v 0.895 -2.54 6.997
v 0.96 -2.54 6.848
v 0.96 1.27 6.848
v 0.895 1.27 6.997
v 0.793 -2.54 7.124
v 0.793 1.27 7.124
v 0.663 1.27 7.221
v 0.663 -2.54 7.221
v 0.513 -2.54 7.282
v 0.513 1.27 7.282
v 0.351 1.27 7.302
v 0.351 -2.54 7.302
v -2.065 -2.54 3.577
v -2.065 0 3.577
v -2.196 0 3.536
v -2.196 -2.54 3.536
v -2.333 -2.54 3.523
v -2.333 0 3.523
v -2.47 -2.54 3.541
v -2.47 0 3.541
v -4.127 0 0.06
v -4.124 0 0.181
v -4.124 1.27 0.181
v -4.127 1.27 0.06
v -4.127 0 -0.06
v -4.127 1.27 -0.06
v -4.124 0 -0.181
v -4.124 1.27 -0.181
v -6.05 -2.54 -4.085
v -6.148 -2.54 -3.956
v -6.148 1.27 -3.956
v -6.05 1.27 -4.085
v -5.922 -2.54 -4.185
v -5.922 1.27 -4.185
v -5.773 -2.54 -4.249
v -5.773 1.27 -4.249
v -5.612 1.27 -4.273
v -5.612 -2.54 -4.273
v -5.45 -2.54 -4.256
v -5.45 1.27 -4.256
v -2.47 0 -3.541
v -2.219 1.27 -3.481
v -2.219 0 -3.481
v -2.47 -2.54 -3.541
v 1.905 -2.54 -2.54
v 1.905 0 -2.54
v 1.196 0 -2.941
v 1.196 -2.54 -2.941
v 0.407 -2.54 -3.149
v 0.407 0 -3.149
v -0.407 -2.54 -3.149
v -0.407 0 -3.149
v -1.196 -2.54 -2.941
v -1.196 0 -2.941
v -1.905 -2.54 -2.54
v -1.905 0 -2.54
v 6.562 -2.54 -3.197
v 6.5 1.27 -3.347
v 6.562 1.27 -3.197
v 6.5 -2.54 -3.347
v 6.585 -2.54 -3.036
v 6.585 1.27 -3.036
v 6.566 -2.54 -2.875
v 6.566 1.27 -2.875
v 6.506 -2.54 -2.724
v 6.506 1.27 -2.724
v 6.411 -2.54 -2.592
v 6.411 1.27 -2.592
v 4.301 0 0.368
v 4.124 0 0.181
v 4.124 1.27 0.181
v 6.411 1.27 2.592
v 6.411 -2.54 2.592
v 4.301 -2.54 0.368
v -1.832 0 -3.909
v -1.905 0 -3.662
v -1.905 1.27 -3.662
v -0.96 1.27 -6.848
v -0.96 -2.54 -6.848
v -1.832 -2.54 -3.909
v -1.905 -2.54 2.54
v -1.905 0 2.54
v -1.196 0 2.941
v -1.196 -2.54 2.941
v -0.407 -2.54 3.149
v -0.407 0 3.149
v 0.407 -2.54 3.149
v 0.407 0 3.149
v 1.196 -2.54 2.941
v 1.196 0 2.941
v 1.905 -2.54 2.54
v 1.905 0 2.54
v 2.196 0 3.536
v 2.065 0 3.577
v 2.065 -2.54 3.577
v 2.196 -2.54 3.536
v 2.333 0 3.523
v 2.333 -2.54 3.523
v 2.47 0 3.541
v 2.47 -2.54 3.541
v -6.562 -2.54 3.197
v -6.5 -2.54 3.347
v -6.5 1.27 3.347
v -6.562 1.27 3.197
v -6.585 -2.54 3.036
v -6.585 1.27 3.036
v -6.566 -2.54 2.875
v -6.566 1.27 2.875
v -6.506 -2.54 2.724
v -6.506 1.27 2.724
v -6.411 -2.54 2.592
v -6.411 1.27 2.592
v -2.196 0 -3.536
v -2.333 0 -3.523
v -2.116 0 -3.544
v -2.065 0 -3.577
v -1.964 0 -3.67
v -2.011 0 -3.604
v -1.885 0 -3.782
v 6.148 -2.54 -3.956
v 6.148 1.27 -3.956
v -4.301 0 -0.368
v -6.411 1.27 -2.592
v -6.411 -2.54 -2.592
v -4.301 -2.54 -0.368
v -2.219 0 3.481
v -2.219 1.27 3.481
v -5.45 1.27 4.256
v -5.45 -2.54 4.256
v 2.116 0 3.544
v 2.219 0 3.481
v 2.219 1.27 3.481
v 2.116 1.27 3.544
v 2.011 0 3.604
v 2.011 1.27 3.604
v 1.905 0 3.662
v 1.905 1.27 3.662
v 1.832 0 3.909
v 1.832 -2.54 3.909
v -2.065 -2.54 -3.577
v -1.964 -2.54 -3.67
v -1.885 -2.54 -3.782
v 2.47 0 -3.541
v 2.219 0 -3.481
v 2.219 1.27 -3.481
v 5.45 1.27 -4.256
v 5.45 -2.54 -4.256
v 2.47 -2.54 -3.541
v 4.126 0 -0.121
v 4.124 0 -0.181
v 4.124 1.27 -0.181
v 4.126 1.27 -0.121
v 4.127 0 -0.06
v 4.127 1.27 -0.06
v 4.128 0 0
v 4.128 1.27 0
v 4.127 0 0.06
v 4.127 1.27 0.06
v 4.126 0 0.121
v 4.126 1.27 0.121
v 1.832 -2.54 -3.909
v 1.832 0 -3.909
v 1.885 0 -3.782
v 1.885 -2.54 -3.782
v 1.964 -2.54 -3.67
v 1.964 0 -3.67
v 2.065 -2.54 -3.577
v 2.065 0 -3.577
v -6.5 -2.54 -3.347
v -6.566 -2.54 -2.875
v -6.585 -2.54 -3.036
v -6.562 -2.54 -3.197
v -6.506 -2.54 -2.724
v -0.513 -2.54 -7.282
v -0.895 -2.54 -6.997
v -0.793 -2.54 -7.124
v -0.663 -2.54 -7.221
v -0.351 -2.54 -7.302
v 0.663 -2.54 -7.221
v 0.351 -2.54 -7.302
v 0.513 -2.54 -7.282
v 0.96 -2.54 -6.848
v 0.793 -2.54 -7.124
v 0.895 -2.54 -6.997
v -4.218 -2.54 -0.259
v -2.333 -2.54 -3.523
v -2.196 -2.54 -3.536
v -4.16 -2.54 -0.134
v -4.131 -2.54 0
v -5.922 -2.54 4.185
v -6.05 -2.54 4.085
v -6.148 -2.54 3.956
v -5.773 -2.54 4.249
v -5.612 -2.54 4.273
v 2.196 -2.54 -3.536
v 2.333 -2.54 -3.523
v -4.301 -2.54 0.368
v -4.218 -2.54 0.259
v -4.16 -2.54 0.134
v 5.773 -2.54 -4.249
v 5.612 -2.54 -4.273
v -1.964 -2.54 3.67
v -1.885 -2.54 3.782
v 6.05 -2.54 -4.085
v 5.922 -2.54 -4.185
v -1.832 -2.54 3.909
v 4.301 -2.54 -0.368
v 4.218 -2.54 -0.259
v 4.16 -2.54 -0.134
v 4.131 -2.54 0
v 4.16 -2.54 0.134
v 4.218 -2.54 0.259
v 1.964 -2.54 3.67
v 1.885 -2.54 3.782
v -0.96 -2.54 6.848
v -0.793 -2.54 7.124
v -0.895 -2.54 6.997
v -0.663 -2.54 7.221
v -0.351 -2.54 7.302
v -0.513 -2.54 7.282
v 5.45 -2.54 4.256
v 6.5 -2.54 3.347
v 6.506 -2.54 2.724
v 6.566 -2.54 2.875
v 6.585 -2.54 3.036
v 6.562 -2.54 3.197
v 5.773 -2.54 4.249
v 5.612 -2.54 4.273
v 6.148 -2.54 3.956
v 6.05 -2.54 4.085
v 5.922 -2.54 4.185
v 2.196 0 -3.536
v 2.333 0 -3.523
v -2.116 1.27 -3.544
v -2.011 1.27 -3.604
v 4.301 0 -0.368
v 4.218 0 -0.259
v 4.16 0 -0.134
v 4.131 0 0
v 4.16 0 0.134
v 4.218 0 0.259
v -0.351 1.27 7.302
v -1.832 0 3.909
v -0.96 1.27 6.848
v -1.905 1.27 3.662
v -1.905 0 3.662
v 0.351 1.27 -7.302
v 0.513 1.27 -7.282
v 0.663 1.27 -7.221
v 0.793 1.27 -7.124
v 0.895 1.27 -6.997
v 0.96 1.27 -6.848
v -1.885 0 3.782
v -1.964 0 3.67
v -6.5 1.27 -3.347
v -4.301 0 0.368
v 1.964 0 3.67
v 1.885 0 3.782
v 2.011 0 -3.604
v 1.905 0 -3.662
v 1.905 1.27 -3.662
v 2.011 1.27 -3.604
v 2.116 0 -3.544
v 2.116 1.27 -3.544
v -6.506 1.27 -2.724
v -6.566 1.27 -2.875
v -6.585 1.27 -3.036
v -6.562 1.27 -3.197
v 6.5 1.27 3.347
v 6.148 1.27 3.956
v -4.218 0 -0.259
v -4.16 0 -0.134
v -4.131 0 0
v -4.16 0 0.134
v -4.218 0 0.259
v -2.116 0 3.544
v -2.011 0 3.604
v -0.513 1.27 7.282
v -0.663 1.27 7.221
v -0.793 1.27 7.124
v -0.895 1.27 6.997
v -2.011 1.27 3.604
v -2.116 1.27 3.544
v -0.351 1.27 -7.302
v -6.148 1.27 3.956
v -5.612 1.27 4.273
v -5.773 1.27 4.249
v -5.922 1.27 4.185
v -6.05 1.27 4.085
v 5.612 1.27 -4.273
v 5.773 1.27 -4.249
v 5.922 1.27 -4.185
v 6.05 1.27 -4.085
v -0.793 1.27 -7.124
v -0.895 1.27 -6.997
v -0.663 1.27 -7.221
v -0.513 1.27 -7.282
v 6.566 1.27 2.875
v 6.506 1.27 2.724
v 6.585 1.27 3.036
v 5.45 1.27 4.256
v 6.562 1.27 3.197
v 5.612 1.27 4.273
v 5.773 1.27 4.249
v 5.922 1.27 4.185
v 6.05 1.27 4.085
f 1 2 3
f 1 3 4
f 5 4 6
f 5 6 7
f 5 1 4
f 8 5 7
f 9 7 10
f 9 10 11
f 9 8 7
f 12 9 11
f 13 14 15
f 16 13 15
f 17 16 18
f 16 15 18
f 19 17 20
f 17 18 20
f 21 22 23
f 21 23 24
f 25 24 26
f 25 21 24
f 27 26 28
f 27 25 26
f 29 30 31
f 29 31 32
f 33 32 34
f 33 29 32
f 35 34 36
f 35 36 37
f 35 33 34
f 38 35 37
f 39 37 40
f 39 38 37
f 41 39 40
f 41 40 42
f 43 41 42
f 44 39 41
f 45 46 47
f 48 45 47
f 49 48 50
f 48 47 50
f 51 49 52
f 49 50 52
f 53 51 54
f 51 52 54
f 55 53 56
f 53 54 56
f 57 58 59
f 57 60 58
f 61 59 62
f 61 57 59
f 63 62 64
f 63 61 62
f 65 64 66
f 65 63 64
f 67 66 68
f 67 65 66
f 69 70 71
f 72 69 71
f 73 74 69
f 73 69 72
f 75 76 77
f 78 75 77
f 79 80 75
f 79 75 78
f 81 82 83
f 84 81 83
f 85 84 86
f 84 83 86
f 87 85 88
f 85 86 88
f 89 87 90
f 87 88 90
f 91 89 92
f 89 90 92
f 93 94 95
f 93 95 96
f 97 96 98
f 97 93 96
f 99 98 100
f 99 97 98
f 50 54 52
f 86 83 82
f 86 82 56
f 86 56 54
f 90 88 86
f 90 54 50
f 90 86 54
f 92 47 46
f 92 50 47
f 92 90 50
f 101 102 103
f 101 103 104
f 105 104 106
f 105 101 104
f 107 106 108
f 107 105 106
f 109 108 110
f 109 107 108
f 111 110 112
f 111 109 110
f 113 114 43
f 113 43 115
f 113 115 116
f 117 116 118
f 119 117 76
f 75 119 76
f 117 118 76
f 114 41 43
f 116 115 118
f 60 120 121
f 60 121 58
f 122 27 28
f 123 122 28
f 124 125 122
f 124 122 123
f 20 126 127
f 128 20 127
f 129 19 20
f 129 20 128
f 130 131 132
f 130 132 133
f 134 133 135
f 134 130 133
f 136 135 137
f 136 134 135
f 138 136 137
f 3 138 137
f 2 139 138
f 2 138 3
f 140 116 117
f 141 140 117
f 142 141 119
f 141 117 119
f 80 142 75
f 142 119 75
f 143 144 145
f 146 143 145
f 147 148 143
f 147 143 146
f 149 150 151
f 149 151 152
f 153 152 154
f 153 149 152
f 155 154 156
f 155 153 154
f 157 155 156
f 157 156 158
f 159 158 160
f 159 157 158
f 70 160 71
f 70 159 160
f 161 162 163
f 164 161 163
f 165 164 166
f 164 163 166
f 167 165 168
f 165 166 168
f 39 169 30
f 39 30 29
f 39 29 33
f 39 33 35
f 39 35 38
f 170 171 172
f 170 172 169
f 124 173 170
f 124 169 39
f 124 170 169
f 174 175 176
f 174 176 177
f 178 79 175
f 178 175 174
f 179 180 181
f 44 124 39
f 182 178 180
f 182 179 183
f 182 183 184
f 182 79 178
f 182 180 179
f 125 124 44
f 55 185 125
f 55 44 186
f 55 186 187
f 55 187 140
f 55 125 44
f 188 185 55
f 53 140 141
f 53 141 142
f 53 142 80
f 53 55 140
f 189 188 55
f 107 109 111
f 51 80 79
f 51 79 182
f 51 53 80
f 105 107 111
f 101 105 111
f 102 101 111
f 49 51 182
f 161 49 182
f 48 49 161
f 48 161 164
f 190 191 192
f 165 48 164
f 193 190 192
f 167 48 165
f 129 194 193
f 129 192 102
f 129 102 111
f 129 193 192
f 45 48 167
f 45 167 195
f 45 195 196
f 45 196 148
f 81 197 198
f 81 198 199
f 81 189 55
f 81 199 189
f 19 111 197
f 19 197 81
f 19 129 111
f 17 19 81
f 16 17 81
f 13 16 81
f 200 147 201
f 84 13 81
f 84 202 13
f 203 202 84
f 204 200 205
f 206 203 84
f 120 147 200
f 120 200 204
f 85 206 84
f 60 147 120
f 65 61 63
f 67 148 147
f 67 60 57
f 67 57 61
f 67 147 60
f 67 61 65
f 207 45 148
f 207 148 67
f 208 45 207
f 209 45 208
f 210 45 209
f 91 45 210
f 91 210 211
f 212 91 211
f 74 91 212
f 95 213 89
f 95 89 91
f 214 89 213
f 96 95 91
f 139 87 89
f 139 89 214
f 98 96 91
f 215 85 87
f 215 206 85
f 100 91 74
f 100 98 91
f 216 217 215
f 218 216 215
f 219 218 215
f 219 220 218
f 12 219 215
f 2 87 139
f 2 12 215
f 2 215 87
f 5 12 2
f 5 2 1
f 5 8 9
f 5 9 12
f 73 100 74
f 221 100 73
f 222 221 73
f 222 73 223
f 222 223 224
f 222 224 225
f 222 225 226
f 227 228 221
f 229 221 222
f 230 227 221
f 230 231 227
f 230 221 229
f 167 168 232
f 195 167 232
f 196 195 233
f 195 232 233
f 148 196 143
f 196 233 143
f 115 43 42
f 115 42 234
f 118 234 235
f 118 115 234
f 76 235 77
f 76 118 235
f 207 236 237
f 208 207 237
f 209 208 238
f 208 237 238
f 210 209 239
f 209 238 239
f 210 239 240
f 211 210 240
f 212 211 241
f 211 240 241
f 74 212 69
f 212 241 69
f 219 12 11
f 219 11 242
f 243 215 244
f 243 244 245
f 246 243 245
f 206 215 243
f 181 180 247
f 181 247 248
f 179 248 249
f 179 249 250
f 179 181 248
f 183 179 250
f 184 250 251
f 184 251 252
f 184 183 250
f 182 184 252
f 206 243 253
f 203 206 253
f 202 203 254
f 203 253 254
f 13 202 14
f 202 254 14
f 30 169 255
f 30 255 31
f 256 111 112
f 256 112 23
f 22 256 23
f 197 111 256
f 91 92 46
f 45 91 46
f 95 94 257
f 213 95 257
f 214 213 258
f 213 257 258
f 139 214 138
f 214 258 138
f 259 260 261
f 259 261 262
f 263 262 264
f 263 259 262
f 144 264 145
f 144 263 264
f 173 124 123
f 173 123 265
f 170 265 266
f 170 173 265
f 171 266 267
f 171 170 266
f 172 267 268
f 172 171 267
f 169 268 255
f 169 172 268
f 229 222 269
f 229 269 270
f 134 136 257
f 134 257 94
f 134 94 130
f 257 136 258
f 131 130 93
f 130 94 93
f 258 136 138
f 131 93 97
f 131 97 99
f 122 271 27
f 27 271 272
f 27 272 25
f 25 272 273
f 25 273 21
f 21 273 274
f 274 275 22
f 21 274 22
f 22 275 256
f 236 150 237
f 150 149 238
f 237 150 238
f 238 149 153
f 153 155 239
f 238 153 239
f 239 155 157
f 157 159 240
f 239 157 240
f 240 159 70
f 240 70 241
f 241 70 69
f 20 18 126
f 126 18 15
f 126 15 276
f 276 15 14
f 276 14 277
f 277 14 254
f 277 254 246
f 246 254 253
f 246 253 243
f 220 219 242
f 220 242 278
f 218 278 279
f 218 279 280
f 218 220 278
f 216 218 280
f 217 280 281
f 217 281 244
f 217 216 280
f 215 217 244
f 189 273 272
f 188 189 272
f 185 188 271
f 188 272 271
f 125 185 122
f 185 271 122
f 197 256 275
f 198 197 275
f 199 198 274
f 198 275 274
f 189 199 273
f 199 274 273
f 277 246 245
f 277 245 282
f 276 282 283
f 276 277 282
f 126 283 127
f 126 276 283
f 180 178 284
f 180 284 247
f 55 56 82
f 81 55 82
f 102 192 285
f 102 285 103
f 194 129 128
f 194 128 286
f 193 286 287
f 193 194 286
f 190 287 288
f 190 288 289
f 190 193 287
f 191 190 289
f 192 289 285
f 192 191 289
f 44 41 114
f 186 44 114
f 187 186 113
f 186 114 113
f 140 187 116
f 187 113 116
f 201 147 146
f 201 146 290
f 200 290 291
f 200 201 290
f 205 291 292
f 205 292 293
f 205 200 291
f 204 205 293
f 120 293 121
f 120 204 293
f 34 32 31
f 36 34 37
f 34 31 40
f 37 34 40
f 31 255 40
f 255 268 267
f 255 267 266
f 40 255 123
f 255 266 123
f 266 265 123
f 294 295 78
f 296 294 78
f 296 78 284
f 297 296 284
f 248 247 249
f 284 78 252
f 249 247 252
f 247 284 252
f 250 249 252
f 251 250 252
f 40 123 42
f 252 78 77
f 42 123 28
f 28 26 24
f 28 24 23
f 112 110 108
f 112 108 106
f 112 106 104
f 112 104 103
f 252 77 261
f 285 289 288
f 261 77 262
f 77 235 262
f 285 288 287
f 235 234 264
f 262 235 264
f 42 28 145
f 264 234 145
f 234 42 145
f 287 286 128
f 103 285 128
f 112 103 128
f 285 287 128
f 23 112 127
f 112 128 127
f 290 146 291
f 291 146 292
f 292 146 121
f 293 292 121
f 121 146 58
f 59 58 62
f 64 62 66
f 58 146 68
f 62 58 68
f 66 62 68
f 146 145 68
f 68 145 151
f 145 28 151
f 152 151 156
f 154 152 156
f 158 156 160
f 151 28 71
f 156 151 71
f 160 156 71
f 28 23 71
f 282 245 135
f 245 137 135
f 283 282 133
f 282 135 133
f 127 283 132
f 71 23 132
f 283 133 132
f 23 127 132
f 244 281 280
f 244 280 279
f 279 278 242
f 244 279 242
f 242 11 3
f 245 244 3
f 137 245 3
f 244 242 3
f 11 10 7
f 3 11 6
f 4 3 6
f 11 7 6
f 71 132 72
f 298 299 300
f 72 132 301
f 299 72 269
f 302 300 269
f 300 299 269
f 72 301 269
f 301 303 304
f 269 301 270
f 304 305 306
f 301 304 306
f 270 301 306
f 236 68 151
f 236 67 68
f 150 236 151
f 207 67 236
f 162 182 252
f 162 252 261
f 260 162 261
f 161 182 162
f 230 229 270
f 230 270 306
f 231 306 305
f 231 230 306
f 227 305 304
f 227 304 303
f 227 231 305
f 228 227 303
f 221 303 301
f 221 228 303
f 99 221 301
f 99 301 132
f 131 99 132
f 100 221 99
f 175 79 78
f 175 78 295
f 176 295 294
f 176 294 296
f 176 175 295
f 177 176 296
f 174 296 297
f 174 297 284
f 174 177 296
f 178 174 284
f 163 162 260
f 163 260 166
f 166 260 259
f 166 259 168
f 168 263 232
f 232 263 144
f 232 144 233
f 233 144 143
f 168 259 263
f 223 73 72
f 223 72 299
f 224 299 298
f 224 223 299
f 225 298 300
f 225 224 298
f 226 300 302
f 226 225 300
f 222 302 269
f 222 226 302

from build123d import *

# Parameters (mm, degrees)
F1_DEPTH    = 2.54
F2_T1_DEPTH = 2.54
F4_DEPTH    = 25.4
F5_DEPTH    = 1.27


# Not quite as in the source:
# - a fillet or chamfer that OpenCascade refuses, or shapes differently, is made with other operations: its cross-section is extruded or revolved along the edge and cut away or added


with BuildPart() as f1:
    # F0 (on Front) → F1 (new body)
    with BuildSketch(Plane.XZ):
        with BuildLine():
            ThreePointArc((4.1235287664, -0.1810159177), (4.1265070722, -0.090529737), (4.1275, 0))
            ThreePointArc((4.1275, 0), (4.1265070722, 0.090529737), (4.1235287664, 0.1810159177))
            ThreePointArc((4.1235287664, 0.1810159177), (3.5745198541, 2.06375), (2.2185287664, 3.4805727061))
            ThreePointArc((2.2185287664, 3.4805727061), (2.06375, 3.5745198541), (1.905, 3.6615886238))
            ThreePointArc((1.905, 3.6615886238), (0, 4.1275), (-1.905, 3.6615886238))
            ThreePointArc((-1.905, 3.6615886238), (-2.06375, 3.5745198541), (-2.2185287664, 3.4805727061))
            ThreePointArc((-2.2185287664, 3.4805727061), (-3.5745198541, 2.06375), (-4.1235287664, 0.1810159177))
            ThreePointArc((-4.1235287664, 0.1810159177), (-4.1275, 0), (-4.1235287664, -0.1810159177))
            ThreePointArc((-4.1235287664, -0.1810159177), (-3.5745198541, -2.06375), (-2.2185287664, -3.4805727061))
            ThreePointArc((-2.2185287664, -3.4805727061), (-2.06375, -3.5745198541), (-1.905, -3.6615886238))
            ThreePointArc((-1.905, -3.6615886238), (0, -4.1275), (1.905, -3.6615886238))
            ThreePointArc((1.905, -3.6615886238), (2.06375, -3.5745198541), (2.2185287664, -3.4805727061))
            ThreePointArc((2.2185287664, -3.4805727061), (3.5745198541, -2.06375), (4.1235287664, -0.1810159177))
        make_face()
        with BuildLine():
            ThreePointArc((2.2185287664, 3.4805727061), (3.5745198541, 2.06375), (4.1235287664, 0.1810159177))
            Line((4.1235287664, 0.1810159177), (6.4106736138, 2.5923984851))
            ThreePointArc((6.4106736138, 2.5923984851), (6.5805571254, 2.9548302166), (6.4998752479, 3.3468858277))
            Line((6.4998752479, 3.3468858277), (6.1484257743, 3.9556141723))
            ThreePointArc((6.1484257743, 3.9556141723), (5.8492365942, 4.2215145333), (5.4504197518, 4.2556069624))
            Line((5.4504197518, 4.2556069624), (2.2185287664, 3.4805727061))
        make_face()
        with BuildLine():
            Line((6.4106736138, -2.5923984851), (4.1235287664, -0.1810159177))
            ThreePointArc((4.1235287664, -0.1810159177), (3.5745198541, -2.06375), (2.2185287664, -3.4805727061))
            Line((2.2185287664, -3.4805727061), (5.4504197518, -4.2556069624))
            ThreePointArc((5.4504197518, -4.2556069624), (5.8492365942, -4.2215145333), (6.1484257743, -3.9556141723))
            Line((6.1484257743, -3.9556141723), (6.4998752479, -3.3468858277))
            ThreePointArc((6.4998752479, -3.3468858277), (6.5805571254, -2.9548302166), (6.4106736138, -2.5923984851))
        make_face()
        with BuildLine():
            ThreePointArc((-1.905, 3.6615886238), (0, 4.1275), (1.905, 3.6615886238))
            Line((1.905, 3.6615886238), (0.9602538621, 6.8480054475))
            ThreePointArc((0.9602538621, 6.8480054475), (0.7313205312, 7.17634475), (0.3514494736, 7.3025))
            Line((0.3514494736, 7.3025), (-0.3514494736, 7.3025))
            ThreePointArc((-0.3514494736, 7.3025), (-0.7313205312, 7.17634475), (-0.9602538621, 6.8480054475))
            Line((-0.9602538621, 6.8480054475), (-1.905, 3.6615886238))
        make_face()
        with BuildLine():
            Line((0.9602538621, -6.8480054475), (1.905, -3.6615886238))
            ThreePointArc((1.905, -3.6615886238), (0, -4.1275), (-1.905, -3.6615886238))
            Line((-1.905, -3.6615886238), (-0.9602538621, -6.8480054475))
            ThreePointArc((-0.9602538621, -6.8480054475), (-0.7313205312, -7.17634475), (-0.3514494736, -7.3025))
            Line((-0.3514494736, -7.3025), (0.3514494736, -7.3025))
            ThreePointArc((0.3514494736, -7.3025), (0.7313205312, -7.17634475), (0.9602538621, -6.8480054475))
        make_face()
        with BuildLine():
            ThreePointArc((-4.1235287664, 0.1810159177), (-3.5745198541, 2.06375), (-2.2185287664, 3.4805727061))
            Line((-2.2185287664, 3.4805727061), (-5.4504197518, 4.2556069624))
            ThreePointArc((-5.4504197518, 4.2556069624), (-5.8492365942, 4.2215145333), (-6.1484257743, 3.9556141723))
            Line((-6.1484257743, 3.9556141723), (-6.4998752479, 3.3468858277))
            ThreePointArc((-6.4998752479, 3.3468858277), (-6.5805571254, 2.9548302166), (-6.4106736138, 2.5923984851))
            Line((-6.4106736138, 2.5923984851), (-4.1235287664, 0.1810159177))
        make_face()
        with BuildLine():
            Line((-5.4504197518, -4.2556069624), (-2.2185287664, -3.4805727061))
            ThreePointArc((-2.2185287664, -3.4805727061), (-3.5745198541, -2.06375), (-4.1235287664, -0.1810159177))
            Line((-4.1235287664, -0.1810159177), (-6.4106736138, -2.5923984851))
            ThreePointArc((-6.4106736138, -2.5923984851), (-6.5805571254, -2.9548302166), (-6.4998752479, -3.3468858277))
            Line((-6.4998752479, -3.3468858277), (-6.1484257743, -3.9556141723))
            ThreePointArc((-6.1484257743, -3.9556141723), (-5.8492365942, -4.2215145333), (-5.4504197518, -4.2556069624))
        make_face()
    extrude(amount=F1_DEPTH)

    # F2: fillet of radius 0.635 on 12 edges, made by hand

    # F2_s2 → F2_t1 (join)
    with BuildSketch(Plane.XZ):
        with BuildLine():
            ThreePointArc((-4.3012819504, 0.3684246555), (-4.1738908411, 0.1709055432), (-4.1270722547, -0.0594209954))
            ThreePointArc((-4.1270722547, -0.0594209954), (-4.1270518266, 0.0608232715), (-4.1235287664, 0.1810159177))
            Line((-4.1235287664, 0.1810159177), (-4.3012819504, 0.3684246555))
        make_face()
        with BuildLine():
            ThreePointArc((-4.1270722547, 0.0594209954), (-4.1738908411, -0.1709055432), (-4.3012819504, -0.3684246555))
            Line((-4.3012819504, -0.3684246555), (-4.1235287664, -0.1810159177))
            ThreePointArc((-4.1235287664, -0.1810159177), (-4.1270518266, -0.0608232715), (-4.1270722547, 0.0594209954))
        make_face()
        with BuildLine():
            ThreePointArc((-1.8315758641, 3.9092317656), (-1.9389368785, 3.7001482727), (-2.1149962189, 3.5444389181))
            ThreePointArc((-2.1149962189, 3.5444389181), (-2.010851415, 3.6045433603), (-1.905, 3.6615886238))
            Line((-1.905, 3.6615886238), (-1.8315758641, 3.9092317656))
        make_face()
        with BuildLine():
            ThreePointArc((4.3012819504, -0.3684246555), (4.1738908411, -0.1709055432), (4.1270722547, 0.0594209954))
            ThreePointArc((4.1270722547, 0.0594209954), (4.1270518266, -0.0608232715), (4.1235287664, -0.1810159177))
            Line((4.1235287664, -0.1810159177), (4.3012819504, -0.3684246555))
        make_face()
        with BuildLine():
            ThreePointArc((2.0120760358, -3.6038599135), (2.2349539626, -3.5292427294), (2.4697060863, -3.5408071101))
            Line((2.4697060863, -3.5408071101), (2.2185287664, -3.4805727061))
            ThreePointArc((2.2185287664, -3.4805727061), (2.1162004116, -3.5437200888), (2.0120760358, -3.6038599135))
        make_face()
        with BuildLine():
            ThreePointArc((1.8315758641, -3.9092317657), (1.9389368785, -3.7001482727), (2.1149962189, -3.5444389181))
            ThreePointArc((2.1149962189, -3.5444389181), (2.010851415, -3.6045433603), (1.905, -3.6615886238))
            Line((1.905, -3.6615886238), (1.8315758641, -3.9092317657))
        make_face()
        with BuildLine():
            ThreePointArc((-2.1149962189, -3.5444389181), (-1.9389368785, -3.7001482727), (-1.8315758641, -3.9092317657))
            Line((-1.8315758641, -3.9092317657), (-1.905, -3.6615886238))
            ThreePointArc((-1.905, -3.6615886238), (-2.010851415, -3.6045433603), (-2.1149962189, -3.5444389181))
        make_face()
        with BuildLine():
            ThreePointArc((-2.4697060863, -3.5408071101), (-2.2349539626, -3.5292427294), (-2.0120760358, -3.6038599135))
            ThreePointArc((-2.0120760358, -3.6038599135), (-2.1162004116, -3.5437200888), (-2.2185287664, -3.4805727061))
            Line((-2.2185287664, -3.4805727061), (-2.4697060863, -3.5408071101))
        make_face()
        with BuildLine():
            ThreePointArc((-2.0120760358, 3.6038599135), (-2.2349539626, 3.5292427294), (-2.4697060863, 3.5408071101))
            Line((-2.4697060863, 3.5408071101), (-2.2185287664, 3.4805727061))
            ThreePointArc((-2.2185287664, 3.4805727061), (-2.1162004116, 3.5437200888), (-2.0120760358, 3.6038599135))
        make_face()
        with BuildLine():
            ThreePointArc((2.1149962189, 3.5444389181), (1.9389368785, 3.7001482727), (1.8315758641, 3.9092317656))
            Line((1.8315758641, 3.9092317656), (1.905, 3.6615886238))
            ThreePointArc((1.905, 3.6615886238), (2.010851415, 3.6045433603), (2.1149962189, 3.5444389181))
        make_face()
        with BuildLine():
            ThreePointArc((2.0120760358, 3.6038599135), (2.2349539626, 3.5292427294), (2.4697060863, 3.5408071101))
            Line((2.4697060863, 3.5408071101), (2.2185287664, 3.4805727061))
            ThreePointArc((2.2185287664, 3.4805727061), (2.1162004116, 3.5437200888), (2.0120760358, 3.6038599135))
        make_face()
        with BuildLine():
            ThreePointArc((4.1270722547, -0.0594209954), (4.1738908411, 0.1709055432), (4.3012819504, 0.3684246555))
            Line((4.3012819504, 0.3684246555), (4.1235287664, 0.1810159177))
            ThreePointArc((4.1235287664, 0.1810159177), (4.1270518266, 0.0608232715), (4.1270722547, -0.0594209954))
        make_face()
    extrude(amount=F2_T1_DEPTH)

    # F3 (on face) → F4 (cut)
    with BuildSketch(Plane(origin=(0, 0, 0), x_dir=(-1, 0, 0), z_dir=(0, 1, 0))):
        with BuildLine():
            Line((-1.905, 2.54), (-1.905, -2.54))
            ThreePointArc((-1.905, -2.54), (0, -3.175), (1.905, -2.54))
            Line((1.905, -2.54), (1.905, 2.54))
            ThreePointArc((1.905, 2.54), (0, 3.175), (-1.905, 2.54))
        make_face()
    extrude(amount=-F4_DEPTH, mode=Mode.SUBTRACT)

    # F0 (on Front) → F5 (join)
    with BuildSketch(Plane.XZ):
        with BuildLine():
            ThreePointArc((4.1235287664, -0.1810159177), (4.1265070722, -0.090529737), (4.1275, 0))
            ThreePointArc((4.1275, 0), (4.1265070722, 0.090529737), (4.1235287664, 0.1810159177))
            ThreePointArc((4.1235287664, 0.1810159177), (3.5745198541, 2.06375), (2.2185287664, 3.4805727061))
            ThreePointArc((2.2185287664, 3.4805727061), (2.06375, 3.5745198541), (1.905, 3.6615886238))
            ThreePointArc((1.905, 3.6615886238), (0, 4.1275), (-1.905, 3.6615886238))
            ThreePointArc((-1.905, 3.6615886238), (-2.06375, 3.5745198541), (-2.2185287664, 3.4805727061))
            ThreePointArc((-2.2185287664, 3.4805727061), (-3.5745198541, 2.06375), (-4.1235287664, 0.1810159177))
            ThreePointArc((-4.1235287664, 0.1810159177), (-4.1275, 0), (-4.1235287664, -0.1810159177))
            ThreePointArc((-4.1235287664, -0.1810159177), (-3.5745198541, -2.06375), (-2.2185287664, -3.4805727061))
            ThreePointArc((-2.2185287664, -3.4805727061), (-2.06375, -3.5745198541), (-1.905, -3.6615886238))
            ThreePointArc((-1.905, -3.6615886238), (0, -4.1275), (1.905, -3.6615886238))
            ThreePointArc((1.905, -3.6615886238), (2.06375, -3.5745198541), (2.2185287664, -3.4805727061))
            ThreePointArc((2.2185287664, -3.4805727061), (3.5745198541, -2.06375), (4.1235287664, -0.1810159177))
        make_face()
        with BuildLine():
            ThreePointArc((2.2185287664, 3.4805727061), (3.5745198541, 2.06375), (4.1235287664, 0.1810159177))
            Line((4.1235287664, 0.1810159177), (6.4106736138, 2.5923984851))
            ThreePointArc((6.4106736138, 2.5923984851), (6.5805571254, 2.9548302166), (6.4998752479, 3.3468858277))
            Line((6.4998752479, 3.3468858277), (6.1484257743, 3.9556141723))
            ThreePointArc((6.1484257743, 3.9556141723), (5.8492365942, 4.2215145333), (5.4504197518, 4.2556069624))
            Line((5.4504197518, 4.2556069624), (2.2185287664, 3.4805727061))
        make_face()
        with BuildLine():
            Line((6.4106736138, -2.5923984851), (4.1235287664, -0.1810159177))
            ThreePointArc((4.1235287664, -0.1810159177), (3.5745198541, -2.06375), (2.2185287664, -3.4805727061))
            Line((2.2185287664, -3.4805727061), (5.4504197518, -4.2556069624))
            ThreePointArc((5.4504197518, -4.2556069624), (5.8492365942, -4.2215145333), (6.1484257743, -3.9556141723))
            Line((6.1484257743, -3.9556141723), (6.4998752479, -3.3468858277))
            ThreePointArc((6.4998752479, -3.3468858277), (6.5805571254, -2.9548302166), (6.4106736138, -2.5923984851))
        make_face()
        with BuildLine():
            ThreePointArc((-1.905, 3.6615886238), (0, 4.1275), (1.905, 3.6615886238))
            Line((1.905, 3.6615886238), (0.9602538621, 6.8480054475))
            ThreePointArc((0.9602538621, 6.8480054475), (0.7313205312, 7.17634475), (0.3514494736, 7.3025))
            Line((0.3514494736, 7.3025), (-0.3514494736, 7.3025))
            ThreePointArc((-0.3514494736, 7.3025), (-0.7313205312, 7.17634475), (-0.9602538621, 6.8480054475))
            Line((-0.9602538621, 6.8480054475), (-1.905, 3.6615886238))
        make_face()
        with BuildLine():
            Line((0.9602538621, -6.8480054475), (1.905, -3.6615886238))
            ThreePointArc((1.905, -3.6615886238), (0, -4.1275), (-1.905, -3.6615886238))
            Line((-1.905, -3.6615886238), (-0.9602538621, -6.8480054475))
            ThreePointArc((-0.9602538621, -6.8480054475), (-0.7313205312, -7.17634475), (-0.3514494736, -7.3025))
            Line((-0.3514494736, -7.3025), (0.3514494736, -7.3025))
            ThreePointArc((0.3514494736, -7.3025), (0.7313205312, -7.17634475), (0.9602538621, -6.8480054475))
        make_face()
        with BuildLine():
            ThreePointArc((-4.1235287664, 0.1810159177), (-3.5745198541, 2.06375), (-2.2185287664, 3.4805727061))
            Line((-2.2185287664, 3.4805727061), (-5.4504197518, 4.2556069624))
            ThreePointArc((-5.4504197518, 4.2556069624), (-5.8492365942, 4.2215145333), (-6.1484257743, 3.9556141723))
            Line((-6.1484257743, 3.9556141723), (-6.4998752479, 3.3468858277))
            ThreePointArc((-6.4998752479, 3.3468858277), (-6.5805571254, 2.9548302166), (-6.4106736138, 2.5923984851))
            Line((-6.4106736138, 2.5923984851), (-4.1235287664, 0.1810159177))
        make_face()
        with BuildLine():
            Line((-5.4504197518, -4.2556069624), (-2.2185287664, -3.4805727061))
            ThreePointArc((-2.2185287664, -3.4805727061), (-3.5745198541, -2.06375), (-4.1235287664, -0.1810159177))
            Line((-4.1235287664, -0.1810159177), (-6.4106736138, -2.5923984851))
            ThreePointArc((-6.4106736138, -2.5923984851), (-6.5805571254, -2.9548302166), (-6.4998752479, -3.3468858277))
            Line((-6.4998752479, -3.3468858277), (-6.1484257743, -3.9556141723))
            ThreePointArc((-6.1484257743, -3.9556141723), (-5.8492365942, -4.2215145333), (-5.4504197518, -4.2556069624))
        make_face()
    extrude(amount=-F5_DEPTH)


solid = f1.part
